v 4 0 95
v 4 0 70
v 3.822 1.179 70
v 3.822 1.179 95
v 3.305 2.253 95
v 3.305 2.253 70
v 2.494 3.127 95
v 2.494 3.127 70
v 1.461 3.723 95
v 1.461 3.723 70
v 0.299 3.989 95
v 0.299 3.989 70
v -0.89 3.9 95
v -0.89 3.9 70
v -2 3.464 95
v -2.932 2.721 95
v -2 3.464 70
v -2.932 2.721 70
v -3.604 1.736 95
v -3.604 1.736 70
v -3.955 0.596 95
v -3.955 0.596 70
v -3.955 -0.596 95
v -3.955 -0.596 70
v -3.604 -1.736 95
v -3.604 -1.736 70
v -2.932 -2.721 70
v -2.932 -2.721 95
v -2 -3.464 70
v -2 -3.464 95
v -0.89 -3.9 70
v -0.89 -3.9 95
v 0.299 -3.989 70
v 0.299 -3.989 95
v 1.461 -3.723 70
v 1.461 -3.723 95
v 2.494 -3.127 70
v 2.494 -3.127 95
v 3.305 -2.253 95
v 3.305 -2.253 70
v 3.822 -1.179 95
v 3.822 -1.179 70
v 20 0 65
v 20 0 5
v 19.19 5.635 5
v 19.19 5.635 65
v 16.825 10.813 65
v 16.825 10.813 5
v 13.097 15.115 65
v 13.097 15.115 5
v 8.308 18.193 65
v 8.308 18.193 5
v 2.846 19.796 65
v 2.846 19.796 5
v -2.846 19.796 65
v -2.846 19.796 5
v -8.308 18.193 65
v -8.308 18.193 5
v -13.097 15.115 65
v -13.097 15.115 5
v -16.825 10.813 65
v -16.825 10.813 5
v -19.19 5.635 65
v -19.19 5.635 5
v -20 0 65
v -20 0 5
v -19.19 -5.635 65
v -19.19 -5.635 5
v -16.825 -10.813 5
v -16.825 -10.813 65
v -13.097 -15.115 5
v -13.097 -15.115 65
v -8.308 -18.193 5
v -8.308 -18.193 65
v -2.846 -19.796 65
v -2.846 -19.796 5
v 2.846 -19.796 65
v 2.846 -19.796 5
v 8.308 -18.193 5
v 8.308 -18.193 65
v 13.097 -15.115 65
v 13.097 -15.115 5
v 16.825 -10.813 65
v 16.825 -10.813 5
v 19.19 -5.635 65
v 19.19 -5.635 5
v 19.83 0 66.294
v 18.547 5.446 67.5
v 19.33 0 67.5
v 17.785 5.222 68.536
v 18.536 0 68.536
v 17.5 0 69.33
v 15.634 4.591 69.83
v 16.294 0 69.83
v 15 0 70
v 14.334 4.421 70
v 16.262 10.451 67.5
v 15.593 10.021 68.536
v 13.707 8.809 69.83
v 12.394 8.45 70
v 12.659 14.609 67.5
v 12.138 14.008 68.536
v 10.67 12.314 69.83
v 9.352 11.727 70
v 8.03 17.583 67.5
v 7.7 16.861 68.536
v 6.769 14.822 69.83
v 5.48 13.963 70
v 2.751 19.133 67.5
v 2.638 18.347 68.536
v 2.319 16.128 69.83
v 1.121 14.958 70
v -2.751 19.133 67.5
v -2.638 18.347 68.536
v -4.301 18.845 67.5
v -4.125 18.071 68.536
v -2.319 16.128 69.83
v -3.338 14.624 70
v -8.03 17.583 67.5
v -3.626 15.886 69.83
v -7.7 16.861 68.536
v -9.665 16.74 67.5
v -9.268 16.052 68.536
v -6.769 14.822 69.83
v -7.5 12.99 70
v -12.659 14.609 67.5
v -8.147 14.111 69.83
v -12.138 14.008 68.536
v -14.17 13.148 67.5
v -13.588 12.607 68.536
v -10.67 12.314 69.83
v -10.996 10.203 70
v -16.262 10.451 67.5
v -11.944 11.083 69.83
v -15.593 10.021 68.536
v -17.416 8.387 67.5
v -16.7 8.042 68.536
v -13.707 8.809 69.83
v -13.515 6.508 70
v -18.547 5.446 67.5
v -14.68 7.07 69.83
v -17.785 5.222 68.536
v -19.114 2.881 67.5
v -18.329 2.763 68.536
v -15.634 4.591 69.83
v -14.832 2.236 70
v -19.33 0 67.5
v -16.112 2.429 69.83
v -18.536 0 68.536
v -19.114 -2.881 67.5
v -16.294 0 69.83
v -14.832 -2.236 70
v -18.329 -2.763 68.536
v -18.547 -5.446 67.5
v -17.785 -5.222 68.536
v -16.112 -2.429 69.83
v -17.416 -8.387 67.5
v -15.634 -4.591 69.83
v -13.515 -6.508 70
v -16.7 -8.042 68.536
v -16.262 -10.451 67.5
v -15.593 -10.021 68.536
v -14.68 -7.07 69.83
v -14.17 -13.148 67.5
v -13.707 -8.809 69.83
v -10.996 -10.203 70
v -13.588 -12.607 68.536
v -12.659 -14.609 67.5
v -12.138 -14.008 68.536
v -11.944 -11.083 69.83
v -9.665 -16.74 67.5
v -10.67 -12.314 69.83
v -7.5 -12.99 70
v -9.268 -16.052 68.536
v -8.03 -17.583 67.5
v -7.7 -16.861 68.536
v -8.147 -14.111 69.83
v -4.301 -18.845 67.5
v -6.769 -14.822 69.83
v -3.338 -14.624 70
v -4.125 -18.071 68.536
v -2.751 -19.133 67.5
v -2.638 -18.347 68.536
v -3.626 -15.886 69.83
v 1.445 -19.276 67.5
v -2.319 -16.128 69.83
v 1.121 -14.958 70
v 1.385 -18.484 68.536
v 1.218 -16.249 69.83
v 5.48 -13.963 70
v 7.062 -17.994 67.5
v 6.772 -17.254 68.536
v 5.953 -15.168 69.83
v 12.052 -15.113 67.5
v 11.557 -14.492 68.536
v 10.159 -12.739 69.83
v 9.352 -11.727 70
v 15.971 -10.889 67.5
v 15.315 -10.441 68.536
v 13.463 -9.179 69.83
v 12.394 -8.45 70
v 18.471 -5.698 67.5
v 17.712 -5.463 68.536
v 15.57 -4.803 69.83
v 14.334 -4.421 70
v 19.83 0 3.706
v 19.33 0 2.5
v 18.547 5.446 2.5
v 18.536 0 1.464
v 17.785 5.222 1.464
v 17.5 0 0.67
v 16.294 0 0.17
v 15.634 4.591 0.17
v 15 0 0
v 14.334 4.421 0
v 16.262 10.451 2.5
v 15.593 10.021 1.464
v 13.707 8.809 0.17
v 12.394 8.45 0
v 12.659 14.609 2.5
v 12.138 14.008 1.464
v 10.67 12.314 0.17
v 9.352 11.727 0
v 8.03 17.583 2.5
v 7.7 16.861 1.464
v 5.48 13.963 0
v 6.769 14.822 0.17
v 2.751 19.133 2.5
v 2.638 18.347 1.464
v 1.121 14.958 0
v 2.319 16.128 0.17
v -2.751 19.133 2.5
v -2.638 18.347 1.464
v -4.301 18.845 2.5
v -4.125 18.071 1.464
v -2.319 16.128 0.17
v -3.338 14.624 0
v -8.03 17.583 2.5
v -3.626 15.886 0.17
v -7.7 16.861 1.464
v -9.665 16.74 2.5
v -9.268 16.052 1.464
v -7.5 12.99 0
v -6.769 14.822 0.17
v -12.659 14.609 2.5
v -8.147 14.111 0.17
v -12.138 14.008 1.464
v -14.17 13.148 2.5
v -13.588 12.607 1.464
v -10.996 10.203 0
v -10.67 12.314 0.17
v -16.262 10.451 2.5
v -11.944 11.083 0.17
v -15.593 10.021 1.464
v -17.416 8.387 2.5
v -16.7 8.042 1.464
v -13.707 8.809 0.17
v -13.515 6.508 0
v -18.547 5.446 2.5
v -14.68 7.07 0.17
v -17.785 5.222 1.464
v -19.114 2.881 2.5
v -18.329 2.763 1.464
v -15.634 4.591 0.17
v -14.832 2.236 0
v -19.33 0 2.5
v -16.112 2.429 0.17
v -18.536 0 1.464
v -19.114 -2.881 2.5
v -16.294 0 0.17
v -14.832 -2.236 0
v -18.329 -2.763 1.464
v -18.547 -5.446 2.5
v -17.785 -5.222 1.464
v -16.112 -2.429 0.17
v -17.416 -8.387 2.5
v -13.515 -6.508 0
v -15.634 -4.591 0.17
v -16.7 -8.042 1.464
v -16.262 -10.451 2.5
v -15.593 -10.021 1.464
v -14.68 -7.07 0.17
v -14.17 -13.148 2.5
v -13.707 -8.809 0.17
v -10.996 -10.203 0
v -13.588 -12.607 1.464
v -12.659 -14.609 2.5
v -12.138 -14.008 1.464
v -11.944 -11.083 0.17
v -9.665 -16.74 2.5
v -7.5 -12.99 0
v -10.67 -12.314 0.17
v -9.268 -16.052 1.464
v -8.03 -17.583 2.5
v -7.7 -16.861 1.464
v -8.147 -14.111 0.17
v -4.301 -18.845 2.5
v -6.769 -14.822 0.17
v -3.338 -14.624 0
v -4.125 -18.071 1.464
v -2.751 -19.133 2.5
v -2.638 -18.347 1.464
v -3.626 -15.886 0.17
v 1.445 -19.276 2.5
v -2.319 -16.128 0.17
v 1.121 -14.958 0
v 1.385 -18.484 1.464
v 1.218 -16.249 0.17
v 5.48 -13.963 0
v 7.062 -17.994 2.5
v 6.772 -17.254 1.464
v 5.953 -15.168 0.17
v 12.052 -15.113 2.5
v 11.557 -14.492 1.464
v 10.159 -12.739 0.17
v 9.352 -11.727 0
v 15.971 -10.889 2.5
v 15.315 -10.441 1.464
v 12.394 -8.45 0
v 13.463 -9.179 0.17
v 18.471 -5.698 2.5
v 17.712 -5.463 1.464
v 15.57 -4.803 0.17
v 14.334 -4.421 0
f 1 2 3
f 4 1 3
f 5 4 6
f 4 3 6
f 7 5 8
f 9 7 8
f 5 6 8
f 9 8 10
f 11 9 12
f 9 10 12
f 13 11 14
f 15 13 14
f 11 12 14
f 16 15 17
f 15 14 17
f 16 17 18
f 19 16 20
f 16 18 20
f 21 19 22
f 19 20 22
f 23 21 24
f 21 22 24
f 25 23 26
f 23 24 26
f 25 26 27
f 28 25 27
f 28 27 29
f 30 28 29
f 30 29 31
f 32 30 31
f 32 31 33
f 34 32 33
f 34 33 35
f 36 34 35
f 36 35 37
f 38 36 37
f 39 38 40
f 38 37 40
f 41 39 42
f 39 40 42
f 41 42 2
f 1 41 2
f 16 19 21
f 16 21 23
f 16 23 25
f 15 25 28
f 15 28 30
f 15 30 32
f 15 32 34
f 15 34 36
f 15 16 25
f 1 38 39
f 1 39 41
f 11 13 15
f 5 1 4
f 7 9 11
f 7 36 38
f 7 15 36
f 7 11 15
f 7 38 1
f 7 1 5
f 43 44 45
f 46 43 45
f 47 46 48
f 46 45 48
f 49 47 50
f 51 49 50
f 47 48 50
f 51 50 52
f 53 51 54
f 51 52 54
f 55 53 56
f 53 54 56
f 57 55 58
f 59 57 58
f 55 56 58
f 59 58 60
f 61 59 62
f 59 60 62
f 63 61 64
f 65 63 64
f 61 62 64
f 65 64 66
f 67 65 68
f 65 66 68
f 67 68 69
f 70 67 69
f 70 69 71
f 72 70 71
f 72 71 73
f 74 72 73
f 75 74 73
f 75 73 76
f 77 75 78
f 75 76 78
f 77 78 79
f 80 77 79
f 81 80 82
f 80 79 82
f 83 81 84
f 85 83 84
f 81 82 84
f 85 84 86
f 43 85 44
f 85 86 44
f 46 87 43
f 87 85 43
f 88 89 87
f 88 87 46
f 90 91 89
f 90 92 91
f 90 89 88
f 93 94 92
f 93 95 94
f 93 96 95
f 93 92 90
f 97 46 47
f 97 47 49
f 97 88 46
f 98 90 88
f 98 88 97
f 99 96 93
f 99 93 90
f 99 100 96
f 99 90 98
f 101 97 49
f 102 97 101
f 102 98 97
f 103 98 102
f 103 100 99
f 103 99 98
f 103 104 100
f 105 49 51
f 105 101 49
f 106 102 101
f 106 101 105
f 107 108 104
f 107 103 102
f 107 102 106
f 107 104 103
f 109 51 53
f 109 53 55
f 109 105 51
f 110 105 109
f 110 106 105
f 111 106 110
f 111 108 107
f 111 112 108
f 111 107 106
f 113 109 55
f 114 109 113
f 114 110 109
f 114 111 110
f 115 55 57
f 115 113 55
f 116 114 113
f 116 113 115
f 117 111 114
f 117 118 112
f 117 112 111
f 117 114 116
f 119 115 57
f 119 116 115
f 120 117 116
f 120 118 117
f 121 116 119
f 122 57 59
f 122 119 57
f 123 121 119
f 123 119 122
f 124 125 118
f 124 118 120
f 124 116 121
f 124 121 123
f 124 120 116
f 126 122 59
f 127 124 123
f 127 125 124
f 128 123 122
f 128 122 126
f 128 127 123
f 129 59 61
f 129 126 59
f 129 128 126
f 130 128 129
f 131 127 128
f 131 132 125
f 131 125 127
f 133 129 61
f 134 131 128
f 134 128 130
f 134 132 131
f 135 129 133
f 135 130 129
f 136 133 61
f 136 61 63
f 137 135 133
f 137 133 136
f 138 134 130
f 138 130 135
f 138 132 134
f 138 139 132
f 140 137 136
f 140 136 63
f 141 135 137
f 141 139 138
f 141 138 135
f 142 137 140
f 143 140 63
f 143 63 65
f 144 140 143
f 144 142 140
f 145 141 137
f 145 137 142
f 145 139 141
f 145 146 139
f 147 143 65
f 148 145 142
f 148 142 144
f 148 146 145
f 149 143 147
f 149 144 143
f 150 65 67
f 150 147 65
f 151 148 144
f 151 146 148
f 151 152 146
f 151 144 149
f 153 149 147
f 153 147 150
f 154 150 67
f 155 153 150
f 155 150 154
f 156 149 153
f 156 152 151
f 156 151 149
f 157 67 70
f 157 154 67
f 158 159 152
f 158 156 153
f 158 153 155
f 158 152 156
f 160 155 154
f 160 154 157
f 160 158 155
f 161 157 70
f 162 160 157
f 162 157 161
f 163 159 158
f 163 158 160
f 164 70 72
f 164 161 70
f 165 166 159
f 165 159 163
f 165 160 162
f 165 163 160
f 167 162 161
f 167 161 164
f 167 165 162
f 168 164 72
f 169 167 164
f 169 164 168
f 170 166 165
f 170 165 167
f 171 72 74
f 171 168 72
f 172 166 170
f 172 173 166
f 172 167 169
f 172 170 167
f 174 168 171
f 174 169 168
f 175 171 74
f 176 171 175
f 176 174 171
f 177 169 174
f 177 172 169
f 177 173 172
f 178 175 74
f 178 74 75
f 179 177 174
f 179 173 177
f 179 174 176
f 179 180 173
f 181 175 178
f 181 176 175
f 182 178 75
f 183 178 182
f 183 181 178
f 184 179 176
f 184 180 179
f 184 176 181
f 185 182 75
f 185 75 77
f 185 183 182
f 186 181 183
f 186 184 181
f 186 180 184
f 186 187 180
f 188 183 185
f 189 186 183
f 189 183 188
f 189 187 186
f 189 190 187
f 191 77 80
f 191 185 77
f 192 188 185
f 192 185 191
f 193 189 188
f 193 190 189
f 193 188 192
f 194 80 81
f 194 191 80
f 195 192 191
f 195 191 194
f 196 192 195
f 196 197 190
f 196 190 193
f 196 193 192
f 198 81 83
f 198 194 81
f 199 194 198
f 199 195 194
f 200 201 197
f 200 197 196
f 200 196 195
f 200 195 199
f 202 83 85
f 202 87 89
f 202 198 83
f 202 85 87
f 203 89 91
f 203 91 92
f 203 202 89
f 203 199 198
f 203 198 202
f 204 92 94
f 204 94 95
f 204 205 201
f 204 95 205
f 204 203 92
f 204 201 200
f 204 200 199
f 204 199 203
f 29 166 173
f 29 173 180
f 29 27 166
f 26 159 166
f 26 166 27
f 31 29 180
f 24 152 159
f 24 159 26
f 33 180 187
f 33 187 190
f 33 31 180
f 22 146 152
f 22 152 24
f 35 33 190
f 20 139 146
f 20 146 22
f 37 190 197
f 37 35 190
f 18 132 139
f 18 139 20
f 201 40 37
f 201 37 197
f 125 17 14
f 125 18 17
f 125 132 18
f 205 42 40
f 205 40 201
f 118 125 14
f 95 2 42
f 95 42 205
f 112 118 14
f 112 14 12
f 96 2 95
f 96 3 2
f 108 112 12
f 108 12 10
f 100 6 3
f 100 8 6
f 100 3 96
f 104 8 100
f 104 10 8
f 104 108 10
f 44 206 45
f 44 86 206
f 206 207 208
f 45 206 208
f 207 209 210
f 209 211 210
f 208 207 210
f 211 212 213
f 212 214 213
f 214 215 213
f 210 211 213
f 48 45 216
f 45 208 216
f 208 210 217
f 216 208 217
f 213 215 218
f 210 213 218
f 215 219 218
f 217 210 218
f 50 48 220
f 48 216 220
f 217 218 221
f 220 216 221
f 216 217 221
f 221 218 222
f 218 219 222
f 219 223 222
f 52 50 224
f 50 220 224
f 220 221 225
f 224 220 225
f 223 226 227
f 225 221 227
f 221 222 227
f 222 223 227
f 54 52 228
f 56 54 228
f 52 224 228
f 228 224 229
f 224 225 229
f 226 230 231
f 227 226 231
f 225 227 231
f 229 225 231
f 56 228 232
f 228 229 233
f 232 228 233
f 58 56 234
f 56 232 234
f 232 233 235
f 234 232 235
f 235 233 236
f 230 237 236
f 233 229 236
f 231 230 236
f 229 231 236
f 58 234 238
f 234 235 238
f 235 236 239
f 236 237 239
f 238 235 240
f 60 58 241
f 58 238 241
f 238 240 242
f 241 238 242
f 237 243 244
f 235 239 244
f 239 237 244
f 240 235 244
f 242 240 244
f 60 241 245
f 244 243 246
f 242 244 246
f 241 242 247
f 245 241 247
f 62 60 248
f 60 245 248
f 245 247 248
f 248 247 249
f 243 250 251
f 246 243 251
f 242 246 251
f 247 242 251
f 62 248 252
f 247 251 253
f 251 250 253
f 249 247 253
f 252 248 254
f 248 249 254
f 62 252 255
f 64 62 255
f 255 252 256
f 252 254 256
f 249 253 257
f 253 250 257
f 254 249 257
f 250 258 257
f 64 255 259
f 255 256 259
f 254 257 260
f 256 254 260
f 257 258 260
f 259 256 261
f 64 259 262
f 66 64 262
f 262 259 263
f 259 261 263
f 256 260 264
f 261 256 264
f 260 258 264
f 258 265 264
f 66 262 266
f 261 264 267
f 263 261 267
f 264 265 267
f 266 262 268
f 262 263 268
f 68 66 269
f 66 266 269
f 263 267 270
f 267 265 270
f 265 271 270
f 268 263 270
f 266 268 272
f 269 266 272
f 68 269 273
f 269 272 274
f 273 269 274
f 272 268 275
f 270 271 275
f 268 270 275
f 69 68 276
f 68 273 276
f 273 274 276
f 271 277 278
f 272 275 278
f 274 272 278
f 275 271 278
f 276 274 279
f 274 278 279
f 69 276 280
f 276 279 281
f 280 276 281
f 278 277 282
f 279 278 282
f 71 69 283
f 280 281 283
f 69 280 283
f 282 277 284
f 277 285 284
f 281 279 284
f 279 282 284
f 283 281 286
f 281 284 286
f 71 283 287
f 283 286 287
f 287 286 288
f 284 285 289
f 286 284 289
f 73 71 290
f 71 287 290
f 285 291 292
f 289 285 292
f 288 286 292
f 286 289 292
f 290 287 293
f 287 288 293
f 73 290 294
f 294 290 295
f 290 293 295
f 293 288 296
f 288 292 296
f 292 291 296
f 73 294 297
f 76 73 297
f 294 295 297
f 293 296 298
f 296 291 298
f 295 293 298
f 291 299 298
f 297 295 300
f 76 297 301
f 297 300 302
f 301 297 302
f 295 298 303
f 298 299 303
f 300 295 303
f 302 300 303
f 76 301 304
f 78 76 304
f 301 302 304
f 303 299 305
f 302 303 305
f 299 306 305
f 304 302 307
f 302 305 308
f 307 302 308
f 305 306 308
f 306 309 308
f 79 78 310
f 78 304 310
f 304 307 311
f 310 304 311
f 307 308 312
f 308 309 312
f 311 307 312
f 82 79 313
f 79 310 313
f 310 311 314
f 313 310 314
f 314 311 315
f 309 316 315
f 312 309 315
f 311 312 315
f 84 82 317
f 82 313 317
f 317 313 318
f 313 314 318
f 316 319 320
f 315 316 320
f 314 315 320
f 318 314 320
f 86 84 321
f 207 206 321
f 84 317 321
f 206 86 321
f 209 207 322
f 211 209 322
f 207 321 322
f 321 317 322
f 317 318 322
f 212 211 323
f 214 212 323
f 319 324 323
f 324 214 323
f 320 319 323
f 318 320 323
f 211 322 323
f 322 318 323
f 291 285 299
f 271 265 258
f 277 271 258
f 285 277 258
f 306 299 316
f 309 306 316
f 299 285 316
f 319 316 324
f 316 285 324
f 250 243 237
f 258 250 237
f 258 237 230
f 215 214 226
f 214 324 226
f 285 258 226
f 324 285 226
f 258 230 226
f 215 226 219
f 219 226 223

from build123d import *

# Parameters (mm, degrees)
SKETCH1_R           = 20
BOSS_EXTRUDE1_DEPTH = 70
SKETCH2_R           = 4
BOSS_EXTRUDE2_DEPTH = 25
FILLET1_R           = 5


with BuildPart() as part:
    # Sketch1 → Boss-Extrude1 (new body)
    with BuildSketch(Plane.XY):
        Circle(SKETCH1_R)
    extrude(amount=BOSS_EXTRUDE1_DEPTH)

    # Sketch2 → Boss-Extrude2 (add)
    with BuildSketch(Plane.XY.offset(70)):
        Circle(SKETCH2_R)
    extrude(amount=BOSS_EXTRUDE2_DEPTH)

    # Fillet1
    fillet1_edges = [part.edges().sort_by_distance(p)[0] for p in [
        (-20, 0, 0),
        (-20, 0, 70),
    ]]
    fillet(fillet1_edges, radius=FILLET1_R)


solid = part.part
